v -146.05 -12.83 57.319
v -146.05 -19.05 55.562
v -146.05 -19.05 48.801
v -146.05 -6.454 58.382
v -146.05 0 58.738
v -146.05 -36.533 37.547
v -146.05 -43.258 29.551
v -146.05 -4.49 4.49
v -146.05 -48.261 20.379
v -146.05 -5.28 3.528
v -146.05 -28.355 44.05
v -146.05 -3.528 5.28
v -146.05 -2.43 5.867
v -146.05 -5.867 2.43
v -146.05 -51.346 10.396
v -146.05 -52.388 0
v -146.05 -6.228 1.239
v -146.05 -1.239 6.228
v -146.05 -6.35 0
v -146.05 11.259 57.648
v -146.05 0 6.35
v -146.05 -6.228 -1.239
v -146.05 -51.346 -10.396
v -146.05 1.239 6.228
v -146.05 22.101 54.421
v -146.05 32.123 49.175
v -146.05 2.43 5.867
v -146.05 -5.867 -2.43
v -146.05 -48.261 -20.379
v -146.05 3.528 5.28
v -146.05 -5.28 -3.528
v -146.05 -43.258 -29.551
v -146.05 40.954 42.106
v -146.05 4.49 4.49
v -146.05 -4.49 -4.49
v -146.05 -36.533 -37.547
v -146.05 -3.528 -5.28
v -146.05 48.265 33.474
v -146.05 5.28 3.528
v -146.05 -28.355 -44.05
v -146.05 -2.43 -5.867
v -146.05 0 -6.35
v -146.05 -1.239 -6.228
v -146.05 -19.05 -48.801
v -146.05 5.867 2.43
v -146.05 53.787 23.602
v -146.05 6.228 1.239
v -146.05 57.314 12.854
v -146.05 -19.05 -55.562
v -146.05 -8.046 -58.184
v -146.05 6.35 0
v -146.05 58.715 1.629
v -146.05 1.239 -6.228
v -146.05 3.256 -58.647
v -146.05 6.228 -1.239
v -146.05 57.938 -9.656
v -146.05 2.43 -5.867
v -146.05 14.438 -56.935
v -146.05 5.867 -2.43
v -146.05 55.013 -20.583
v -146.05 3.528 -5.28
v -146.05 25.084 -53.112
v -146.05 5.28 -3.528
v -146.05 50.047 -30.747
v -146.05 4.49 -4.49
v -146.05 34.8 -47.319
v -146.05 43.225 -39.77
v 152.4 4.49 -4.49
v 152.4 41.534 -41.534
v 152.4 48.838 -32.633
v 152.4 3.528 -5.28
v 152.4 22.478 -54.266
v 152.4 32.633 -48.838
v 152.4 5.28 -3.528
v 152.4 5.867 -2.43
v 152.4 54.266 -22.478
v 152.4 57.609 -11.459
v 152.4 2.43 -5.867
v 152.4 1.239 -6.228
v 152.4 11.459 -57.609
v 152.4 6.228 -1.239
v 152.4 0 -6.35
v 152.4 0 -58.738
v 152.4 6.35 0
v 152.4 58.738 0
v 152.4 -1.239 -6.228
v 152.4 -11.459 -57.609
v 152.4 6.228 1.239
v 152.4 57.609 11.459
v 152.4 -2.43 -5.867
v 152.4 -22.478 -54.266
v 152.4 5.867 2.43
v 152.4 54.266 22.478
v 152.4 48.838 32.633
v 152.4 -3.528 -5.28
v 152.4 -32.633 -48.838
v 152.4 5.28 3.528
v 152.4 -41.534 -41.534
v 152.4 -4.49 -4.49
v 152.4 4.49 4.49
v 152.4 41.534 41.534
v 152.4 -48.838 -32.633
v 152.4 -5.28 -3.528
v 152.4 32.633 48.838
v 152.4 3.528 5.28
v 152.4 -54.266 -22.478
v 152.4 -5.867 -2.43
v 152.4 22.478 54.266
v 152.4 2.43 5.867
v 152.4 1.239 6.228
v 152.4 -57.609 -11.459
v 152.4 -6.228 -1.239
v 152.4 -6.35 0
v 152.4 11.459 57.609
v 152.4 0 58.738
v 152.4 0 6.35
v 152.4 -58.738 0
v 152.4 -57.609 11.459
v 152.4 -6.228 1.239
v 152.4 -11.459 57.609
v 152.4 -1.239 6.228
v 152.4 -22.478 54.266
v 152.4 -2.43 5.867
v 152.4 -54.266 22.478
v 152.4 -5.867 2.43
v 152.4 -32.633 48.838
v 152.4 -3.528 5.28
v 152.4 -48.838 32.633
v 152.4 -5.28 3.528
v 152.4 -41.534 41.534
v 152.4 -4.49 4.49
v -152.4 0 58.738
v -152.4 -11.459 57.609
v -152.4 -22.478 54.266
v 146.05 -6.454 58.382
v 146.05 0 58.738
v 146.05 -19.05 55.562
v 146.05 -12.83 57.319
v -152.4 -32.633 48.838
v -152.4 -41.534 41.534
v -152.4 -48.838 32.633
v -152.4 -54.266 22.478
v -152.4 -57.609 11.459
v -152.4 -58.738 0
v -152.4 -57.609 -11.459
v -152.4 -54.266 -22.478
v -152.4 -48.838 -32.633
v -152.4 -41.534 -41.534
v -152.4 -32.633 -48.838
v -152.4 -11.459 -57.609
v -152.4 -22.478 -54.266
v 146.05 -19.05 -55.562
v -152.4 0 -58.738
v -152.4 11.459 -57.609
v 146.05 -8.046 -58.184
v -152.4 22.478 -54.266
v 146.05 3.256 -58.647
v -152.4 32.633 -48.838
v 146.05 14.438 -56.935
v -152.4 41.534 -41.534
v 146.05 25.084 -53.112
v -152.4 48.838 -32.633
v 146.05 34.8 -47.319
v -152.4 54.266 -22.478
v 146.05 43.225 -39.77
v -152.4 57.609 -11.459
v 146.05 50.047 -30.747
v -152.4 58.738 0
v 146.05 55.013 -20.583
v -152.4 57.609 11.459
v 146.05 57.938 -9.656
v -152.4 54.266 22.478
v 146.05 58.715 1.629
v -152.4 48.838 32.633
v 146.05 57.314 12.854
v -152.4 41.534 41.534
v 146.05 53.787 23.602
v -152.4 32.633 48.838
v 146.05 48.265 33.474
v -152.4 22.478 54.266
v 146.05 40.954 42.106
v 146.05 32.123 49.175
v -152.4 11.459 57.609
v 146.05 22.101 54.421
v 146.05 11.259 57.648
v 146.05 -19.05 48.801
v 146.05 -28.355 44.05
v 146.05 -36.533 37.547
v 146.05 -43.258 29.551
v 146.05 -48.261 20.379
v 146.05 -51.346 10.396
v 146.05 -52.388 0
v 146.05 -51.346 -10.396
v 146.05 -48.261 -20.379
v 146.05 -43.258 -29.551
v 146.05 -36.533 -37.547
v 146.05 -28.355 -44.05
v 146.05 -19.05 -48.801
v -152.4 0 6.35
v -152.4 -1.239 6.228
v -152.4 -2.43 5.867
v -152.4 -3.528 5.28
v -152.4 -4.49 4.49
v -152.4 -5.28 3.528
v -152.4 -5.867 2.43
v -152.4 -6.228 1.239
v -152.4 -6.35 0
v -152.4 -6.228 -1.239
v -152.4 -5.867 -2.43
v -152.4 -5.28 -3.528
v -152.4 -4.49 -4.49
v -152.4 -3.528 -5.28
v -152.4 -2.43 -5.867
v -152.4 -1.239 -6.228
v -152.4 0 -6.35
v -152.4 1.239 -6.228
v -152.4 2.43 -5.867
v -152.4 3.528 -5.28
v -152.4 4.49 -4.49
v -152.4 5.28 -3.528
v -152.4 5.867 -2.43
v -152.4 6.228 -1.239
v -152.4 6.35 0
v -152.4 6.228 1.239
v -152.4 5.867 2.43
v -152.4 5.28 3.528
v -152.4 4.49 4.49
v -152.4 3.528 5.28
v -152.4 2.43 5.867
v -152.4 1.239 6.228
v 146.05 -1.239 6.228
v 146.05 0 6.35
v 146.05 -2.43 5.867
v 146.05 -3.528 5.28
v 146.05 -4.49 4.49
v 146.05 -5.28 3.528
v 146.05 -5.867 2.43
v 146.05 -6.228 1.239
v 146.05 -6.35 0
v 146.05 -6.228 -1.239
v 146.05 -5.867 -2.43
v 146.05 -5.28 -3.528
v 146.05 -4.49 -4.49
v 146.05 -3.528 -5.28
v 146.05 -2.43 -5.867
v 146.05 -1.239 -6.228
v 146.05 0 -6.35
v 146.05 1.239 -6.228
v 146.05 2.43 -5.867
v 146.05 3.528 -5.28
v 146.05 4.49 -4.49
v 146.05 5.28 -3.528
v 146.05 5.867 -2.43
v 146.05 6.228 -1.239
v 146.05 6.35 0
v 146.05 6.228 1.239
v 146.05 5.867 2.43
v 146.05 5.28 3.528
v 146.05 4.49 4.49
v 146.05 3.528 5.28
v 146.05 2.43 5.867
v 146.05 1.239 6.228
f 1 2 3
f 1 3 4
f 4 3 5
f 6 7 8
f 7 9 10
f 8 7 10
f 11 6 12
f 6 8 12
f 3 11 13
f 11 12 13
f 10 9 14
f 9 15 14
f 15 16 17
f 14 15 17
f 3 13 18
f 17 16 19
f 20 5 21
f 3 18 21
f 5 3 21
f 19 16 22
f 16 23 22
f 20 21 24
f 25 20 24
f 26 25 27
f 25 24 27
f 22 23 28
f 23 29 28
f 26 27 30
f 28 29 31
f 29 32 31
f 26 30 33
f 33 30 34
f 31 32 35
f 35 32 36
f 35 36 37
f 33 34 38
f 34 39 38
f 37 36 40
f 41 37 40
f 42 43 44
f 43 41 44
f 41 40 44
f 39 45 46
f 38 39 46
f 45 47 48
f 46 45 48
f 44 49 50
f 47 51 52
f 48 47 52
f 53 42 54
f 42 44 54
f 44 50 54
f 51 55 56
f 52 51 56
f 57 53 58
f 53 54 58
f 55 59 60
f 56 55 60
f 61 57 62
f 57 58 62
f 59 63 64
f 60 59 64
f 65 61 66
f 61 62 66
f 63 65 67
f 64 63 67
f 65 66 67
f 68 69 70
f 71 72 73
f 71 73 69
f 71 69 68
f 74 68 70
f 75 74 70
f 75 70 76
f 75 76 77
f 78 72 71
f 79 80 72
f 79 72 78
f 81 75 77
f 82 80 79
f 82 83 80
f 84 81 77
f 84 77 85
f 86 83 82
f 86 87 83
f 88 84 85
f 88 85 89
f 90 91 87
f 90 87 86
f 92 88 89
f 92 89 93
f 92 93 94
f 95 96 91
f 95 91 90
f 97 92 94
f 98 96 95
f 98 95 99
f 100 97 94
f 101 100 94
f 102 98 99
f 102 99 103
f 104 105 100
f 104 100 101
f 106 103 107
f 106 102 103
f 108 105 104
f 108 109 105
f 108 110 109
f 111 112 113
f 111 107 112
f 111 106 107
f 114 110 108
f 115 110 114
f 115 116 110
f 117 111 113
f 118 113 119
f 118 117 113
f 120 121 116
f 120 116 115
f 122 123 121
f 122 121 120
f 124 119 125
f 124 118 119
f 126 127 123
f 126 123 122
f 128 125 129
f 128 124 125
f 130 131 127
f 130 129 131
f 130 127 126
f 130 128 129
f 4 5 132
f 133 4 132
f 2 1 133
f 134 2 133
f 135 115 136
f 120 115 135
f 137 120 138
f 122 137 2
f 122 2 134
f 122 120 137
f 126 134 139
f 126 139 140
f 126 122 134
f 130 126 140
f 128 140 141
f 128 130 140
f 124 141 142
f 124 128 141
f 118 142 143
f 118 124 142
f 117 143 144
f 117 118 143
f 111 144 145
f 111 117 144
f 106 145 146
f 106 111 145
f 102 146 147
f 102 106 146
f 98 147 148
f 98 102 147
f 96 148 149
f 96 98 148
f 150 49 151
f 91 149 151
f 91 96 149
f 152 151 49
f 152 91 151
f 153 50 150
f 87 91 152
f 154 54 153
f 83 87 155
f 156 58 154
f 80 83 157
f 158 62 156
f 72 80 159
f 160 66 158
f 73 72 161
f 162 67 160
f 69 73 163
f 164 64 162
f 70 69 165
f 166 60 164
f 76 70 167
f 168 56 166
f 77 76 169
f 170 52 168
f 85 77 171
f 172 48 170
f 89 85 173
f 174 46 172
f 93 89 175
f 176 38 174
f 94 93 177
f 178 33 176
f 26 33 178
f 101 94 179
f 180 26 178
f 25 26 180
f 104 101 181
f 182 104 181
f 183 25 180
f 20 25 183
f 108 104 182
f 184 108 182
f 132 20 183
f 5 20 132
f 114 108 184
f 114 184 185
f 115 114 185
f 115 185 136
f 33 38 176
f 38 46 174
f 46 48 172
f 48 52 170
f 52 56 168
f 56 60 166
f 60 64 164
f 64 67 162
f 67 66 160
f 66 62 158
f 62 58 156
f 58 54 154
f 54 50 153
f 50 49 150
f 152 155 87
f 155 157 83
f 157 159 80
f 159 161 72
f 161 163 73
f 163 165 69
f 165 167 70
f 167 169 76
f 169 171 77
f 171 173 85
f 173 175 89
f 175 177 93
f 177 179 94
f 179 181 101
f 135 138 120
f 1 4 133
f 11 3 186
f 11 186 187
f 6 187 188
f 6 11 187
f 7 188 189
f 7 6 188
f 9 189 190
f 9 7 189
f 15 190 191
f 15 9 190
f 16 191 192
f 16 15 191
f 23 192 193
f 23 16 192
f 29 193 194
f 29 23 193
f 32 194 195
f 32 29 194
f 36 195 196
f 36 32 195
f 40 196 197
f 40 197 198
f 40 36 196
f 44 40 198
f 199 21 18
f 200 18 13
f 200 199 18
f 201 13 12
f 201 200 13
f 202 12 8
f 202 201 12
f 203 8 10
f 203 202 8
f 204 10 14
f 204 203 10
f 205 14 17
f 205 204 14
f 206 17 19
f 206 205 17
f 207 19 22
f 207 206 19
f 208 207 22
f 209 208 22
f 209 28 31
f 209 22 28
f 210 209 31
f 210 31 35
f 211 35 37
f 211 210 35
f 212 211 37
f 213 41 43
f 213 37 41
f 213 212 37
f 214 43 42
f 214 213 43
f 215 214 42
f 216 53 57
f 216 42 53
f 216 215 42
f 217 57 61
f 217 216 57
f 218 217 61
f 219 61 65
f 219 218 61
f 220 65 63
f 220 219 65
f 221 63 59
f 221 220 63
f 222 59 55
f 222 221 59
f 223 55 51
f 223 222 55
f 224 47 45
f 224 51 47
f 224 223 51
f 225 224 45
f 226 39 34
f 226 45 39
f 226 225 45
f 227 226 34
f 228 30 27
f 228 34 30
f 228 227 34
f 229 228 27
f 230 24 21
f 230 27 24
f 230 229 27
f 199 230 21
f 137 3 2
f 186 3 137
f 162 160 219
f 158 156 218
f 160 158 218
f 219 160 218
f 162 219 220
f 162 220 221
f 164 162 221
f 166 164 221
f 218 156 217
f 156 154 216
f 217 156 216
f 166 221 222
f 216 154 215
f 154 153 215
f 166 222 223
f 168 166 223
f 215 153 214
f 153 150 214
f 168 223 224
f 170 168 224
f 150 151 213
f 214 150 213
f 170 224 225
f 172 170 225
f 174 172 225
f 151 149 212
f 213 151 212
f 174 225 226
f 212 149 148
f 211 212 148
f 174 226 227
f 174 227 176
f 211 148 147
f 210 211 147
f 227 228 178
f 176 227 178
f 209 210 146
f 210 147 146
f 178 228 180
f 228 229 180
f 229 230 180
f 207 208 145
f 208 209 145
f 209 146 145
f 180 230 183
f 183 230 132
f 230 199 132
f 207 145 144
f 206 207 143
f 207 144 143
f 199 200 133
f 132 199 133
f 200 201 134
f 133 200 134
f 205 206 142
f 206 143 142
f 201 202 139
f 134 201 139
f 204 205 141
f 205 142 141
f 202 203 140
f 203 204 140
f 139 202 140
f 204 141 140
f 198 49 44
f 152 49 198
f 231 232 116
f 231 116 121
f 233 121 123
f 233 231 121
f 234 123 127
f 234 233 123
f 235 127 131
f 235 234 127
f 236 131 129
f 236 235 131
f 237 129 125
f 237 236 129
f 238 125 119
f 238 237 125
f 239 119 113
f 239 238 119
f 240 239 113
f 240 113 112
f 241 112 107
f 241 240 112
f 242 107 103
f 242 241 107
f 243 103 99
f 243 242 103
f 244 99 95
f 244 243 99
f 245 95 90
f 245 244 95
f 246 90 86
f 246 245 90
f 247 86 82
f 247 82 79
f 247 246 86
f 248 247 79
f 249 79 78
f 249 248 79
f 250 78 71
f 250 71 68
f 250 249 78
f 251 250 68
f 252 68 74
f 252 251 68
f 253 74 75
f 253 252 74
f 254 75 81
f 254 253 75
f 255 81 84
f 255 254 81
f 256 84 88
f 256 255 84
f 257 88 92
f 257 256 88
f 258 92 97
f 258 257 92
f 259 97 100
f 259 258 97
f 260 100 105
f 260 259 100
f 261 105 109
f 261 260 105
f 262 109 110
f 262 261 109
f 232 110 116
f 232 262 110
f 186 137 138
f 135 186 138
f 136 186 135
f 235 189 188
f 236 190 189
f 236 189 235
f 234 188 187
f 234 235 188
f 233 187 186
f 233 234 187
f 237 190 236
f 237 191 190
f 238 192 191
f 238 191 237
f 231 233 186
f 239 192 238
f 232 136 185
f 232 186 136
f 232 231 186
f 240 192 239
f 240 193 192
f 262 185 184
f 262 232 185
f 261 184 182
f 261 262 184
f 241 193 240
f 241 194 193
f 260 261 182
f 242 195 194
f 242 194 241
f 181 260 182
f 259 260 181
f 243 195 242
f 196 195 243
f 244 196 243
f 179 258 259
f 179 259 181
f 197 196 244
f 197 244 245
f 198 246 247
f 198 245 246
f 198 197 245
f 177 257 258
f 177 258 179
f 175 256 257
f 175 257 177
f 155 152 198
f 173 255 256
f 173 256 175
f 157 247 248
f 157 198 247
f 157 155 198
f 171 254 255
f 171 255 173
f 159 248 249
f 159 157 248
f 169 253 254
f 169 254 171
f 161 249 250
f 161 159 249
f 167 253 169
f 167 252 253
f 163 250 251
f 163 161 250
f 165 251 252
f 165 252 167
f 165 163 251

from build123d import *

# Parameters (mm, degrees)
SKETCH1_R               = 58.7375
SKETCH1_R_2             = 6.35
BOSS_EXTRUDE1_DEPTH     = 152.4
CUT_EXTRUDE1_DEPTH      = 174.568279972
CUT_EXTRUDE1_DEPTH_BACK = 174.568279972
SKETCH2_W               = 292.1
SKETCH2_H               = 77.7875
SHELL1_START            = -146.05
SHELL1_DEPTH            = 292.1


# Read off the part's stored shape, not the designer's step: Shell1
with BuildPart() as part:
    # Sketch1 → Boss-Extrude1 (new, symmetric)
    with BuildSketch(Plane(origin=(0, 0, 0), x_dir=(0, 0, -1), z_dir=(1, 0, 0))):
        with Locations(Location((0, 0, 0), (0, 0, 180))):
            Circle(SKETCH1_R)
        with Locations(Location((0, 0, 0), (0, 0, 180))):
            Circle(SKETCH1_R_2, mode=Mode.SUBTRACT)
    extrude(amount=BOSS_EXTRUDE1_DEPTH, both=True)

    # Sketch2 → Cut-Extrude1 (cut, two sides: drawn at the far end of the back side and taken through both)
    with BuildSketch(Plane.XY.offset(-CUT_EXTRUDE1_DEPTH_BACK)):
        with Locations((0, 19.84375)):
            Rectangle(SKETCH2_W, SKETCH2_H)
    extrude(amount=CUT_EXTRUDE1_DEPTH + CUT_EXTRUDE1_DEPTH_BACK, mode=Mode.SUBTRACT)

    # Shell1 outline → Shell1 (cut)
    with BuildSketch(Plane.YZ.offset(SHELL1_START)):
        with BuildLine():
            ThreePointArc((-19.05, 48.801103023), (-52.3875, 0), (-19.05, -48.801103023))
            Line((-19.05, -48.801103023), (-19.05, 48.801103023))
        make_face()
    extrude(amount=SHELL1_DEPTH, mode=Mode.SUBTRACT)


solid = part.part
